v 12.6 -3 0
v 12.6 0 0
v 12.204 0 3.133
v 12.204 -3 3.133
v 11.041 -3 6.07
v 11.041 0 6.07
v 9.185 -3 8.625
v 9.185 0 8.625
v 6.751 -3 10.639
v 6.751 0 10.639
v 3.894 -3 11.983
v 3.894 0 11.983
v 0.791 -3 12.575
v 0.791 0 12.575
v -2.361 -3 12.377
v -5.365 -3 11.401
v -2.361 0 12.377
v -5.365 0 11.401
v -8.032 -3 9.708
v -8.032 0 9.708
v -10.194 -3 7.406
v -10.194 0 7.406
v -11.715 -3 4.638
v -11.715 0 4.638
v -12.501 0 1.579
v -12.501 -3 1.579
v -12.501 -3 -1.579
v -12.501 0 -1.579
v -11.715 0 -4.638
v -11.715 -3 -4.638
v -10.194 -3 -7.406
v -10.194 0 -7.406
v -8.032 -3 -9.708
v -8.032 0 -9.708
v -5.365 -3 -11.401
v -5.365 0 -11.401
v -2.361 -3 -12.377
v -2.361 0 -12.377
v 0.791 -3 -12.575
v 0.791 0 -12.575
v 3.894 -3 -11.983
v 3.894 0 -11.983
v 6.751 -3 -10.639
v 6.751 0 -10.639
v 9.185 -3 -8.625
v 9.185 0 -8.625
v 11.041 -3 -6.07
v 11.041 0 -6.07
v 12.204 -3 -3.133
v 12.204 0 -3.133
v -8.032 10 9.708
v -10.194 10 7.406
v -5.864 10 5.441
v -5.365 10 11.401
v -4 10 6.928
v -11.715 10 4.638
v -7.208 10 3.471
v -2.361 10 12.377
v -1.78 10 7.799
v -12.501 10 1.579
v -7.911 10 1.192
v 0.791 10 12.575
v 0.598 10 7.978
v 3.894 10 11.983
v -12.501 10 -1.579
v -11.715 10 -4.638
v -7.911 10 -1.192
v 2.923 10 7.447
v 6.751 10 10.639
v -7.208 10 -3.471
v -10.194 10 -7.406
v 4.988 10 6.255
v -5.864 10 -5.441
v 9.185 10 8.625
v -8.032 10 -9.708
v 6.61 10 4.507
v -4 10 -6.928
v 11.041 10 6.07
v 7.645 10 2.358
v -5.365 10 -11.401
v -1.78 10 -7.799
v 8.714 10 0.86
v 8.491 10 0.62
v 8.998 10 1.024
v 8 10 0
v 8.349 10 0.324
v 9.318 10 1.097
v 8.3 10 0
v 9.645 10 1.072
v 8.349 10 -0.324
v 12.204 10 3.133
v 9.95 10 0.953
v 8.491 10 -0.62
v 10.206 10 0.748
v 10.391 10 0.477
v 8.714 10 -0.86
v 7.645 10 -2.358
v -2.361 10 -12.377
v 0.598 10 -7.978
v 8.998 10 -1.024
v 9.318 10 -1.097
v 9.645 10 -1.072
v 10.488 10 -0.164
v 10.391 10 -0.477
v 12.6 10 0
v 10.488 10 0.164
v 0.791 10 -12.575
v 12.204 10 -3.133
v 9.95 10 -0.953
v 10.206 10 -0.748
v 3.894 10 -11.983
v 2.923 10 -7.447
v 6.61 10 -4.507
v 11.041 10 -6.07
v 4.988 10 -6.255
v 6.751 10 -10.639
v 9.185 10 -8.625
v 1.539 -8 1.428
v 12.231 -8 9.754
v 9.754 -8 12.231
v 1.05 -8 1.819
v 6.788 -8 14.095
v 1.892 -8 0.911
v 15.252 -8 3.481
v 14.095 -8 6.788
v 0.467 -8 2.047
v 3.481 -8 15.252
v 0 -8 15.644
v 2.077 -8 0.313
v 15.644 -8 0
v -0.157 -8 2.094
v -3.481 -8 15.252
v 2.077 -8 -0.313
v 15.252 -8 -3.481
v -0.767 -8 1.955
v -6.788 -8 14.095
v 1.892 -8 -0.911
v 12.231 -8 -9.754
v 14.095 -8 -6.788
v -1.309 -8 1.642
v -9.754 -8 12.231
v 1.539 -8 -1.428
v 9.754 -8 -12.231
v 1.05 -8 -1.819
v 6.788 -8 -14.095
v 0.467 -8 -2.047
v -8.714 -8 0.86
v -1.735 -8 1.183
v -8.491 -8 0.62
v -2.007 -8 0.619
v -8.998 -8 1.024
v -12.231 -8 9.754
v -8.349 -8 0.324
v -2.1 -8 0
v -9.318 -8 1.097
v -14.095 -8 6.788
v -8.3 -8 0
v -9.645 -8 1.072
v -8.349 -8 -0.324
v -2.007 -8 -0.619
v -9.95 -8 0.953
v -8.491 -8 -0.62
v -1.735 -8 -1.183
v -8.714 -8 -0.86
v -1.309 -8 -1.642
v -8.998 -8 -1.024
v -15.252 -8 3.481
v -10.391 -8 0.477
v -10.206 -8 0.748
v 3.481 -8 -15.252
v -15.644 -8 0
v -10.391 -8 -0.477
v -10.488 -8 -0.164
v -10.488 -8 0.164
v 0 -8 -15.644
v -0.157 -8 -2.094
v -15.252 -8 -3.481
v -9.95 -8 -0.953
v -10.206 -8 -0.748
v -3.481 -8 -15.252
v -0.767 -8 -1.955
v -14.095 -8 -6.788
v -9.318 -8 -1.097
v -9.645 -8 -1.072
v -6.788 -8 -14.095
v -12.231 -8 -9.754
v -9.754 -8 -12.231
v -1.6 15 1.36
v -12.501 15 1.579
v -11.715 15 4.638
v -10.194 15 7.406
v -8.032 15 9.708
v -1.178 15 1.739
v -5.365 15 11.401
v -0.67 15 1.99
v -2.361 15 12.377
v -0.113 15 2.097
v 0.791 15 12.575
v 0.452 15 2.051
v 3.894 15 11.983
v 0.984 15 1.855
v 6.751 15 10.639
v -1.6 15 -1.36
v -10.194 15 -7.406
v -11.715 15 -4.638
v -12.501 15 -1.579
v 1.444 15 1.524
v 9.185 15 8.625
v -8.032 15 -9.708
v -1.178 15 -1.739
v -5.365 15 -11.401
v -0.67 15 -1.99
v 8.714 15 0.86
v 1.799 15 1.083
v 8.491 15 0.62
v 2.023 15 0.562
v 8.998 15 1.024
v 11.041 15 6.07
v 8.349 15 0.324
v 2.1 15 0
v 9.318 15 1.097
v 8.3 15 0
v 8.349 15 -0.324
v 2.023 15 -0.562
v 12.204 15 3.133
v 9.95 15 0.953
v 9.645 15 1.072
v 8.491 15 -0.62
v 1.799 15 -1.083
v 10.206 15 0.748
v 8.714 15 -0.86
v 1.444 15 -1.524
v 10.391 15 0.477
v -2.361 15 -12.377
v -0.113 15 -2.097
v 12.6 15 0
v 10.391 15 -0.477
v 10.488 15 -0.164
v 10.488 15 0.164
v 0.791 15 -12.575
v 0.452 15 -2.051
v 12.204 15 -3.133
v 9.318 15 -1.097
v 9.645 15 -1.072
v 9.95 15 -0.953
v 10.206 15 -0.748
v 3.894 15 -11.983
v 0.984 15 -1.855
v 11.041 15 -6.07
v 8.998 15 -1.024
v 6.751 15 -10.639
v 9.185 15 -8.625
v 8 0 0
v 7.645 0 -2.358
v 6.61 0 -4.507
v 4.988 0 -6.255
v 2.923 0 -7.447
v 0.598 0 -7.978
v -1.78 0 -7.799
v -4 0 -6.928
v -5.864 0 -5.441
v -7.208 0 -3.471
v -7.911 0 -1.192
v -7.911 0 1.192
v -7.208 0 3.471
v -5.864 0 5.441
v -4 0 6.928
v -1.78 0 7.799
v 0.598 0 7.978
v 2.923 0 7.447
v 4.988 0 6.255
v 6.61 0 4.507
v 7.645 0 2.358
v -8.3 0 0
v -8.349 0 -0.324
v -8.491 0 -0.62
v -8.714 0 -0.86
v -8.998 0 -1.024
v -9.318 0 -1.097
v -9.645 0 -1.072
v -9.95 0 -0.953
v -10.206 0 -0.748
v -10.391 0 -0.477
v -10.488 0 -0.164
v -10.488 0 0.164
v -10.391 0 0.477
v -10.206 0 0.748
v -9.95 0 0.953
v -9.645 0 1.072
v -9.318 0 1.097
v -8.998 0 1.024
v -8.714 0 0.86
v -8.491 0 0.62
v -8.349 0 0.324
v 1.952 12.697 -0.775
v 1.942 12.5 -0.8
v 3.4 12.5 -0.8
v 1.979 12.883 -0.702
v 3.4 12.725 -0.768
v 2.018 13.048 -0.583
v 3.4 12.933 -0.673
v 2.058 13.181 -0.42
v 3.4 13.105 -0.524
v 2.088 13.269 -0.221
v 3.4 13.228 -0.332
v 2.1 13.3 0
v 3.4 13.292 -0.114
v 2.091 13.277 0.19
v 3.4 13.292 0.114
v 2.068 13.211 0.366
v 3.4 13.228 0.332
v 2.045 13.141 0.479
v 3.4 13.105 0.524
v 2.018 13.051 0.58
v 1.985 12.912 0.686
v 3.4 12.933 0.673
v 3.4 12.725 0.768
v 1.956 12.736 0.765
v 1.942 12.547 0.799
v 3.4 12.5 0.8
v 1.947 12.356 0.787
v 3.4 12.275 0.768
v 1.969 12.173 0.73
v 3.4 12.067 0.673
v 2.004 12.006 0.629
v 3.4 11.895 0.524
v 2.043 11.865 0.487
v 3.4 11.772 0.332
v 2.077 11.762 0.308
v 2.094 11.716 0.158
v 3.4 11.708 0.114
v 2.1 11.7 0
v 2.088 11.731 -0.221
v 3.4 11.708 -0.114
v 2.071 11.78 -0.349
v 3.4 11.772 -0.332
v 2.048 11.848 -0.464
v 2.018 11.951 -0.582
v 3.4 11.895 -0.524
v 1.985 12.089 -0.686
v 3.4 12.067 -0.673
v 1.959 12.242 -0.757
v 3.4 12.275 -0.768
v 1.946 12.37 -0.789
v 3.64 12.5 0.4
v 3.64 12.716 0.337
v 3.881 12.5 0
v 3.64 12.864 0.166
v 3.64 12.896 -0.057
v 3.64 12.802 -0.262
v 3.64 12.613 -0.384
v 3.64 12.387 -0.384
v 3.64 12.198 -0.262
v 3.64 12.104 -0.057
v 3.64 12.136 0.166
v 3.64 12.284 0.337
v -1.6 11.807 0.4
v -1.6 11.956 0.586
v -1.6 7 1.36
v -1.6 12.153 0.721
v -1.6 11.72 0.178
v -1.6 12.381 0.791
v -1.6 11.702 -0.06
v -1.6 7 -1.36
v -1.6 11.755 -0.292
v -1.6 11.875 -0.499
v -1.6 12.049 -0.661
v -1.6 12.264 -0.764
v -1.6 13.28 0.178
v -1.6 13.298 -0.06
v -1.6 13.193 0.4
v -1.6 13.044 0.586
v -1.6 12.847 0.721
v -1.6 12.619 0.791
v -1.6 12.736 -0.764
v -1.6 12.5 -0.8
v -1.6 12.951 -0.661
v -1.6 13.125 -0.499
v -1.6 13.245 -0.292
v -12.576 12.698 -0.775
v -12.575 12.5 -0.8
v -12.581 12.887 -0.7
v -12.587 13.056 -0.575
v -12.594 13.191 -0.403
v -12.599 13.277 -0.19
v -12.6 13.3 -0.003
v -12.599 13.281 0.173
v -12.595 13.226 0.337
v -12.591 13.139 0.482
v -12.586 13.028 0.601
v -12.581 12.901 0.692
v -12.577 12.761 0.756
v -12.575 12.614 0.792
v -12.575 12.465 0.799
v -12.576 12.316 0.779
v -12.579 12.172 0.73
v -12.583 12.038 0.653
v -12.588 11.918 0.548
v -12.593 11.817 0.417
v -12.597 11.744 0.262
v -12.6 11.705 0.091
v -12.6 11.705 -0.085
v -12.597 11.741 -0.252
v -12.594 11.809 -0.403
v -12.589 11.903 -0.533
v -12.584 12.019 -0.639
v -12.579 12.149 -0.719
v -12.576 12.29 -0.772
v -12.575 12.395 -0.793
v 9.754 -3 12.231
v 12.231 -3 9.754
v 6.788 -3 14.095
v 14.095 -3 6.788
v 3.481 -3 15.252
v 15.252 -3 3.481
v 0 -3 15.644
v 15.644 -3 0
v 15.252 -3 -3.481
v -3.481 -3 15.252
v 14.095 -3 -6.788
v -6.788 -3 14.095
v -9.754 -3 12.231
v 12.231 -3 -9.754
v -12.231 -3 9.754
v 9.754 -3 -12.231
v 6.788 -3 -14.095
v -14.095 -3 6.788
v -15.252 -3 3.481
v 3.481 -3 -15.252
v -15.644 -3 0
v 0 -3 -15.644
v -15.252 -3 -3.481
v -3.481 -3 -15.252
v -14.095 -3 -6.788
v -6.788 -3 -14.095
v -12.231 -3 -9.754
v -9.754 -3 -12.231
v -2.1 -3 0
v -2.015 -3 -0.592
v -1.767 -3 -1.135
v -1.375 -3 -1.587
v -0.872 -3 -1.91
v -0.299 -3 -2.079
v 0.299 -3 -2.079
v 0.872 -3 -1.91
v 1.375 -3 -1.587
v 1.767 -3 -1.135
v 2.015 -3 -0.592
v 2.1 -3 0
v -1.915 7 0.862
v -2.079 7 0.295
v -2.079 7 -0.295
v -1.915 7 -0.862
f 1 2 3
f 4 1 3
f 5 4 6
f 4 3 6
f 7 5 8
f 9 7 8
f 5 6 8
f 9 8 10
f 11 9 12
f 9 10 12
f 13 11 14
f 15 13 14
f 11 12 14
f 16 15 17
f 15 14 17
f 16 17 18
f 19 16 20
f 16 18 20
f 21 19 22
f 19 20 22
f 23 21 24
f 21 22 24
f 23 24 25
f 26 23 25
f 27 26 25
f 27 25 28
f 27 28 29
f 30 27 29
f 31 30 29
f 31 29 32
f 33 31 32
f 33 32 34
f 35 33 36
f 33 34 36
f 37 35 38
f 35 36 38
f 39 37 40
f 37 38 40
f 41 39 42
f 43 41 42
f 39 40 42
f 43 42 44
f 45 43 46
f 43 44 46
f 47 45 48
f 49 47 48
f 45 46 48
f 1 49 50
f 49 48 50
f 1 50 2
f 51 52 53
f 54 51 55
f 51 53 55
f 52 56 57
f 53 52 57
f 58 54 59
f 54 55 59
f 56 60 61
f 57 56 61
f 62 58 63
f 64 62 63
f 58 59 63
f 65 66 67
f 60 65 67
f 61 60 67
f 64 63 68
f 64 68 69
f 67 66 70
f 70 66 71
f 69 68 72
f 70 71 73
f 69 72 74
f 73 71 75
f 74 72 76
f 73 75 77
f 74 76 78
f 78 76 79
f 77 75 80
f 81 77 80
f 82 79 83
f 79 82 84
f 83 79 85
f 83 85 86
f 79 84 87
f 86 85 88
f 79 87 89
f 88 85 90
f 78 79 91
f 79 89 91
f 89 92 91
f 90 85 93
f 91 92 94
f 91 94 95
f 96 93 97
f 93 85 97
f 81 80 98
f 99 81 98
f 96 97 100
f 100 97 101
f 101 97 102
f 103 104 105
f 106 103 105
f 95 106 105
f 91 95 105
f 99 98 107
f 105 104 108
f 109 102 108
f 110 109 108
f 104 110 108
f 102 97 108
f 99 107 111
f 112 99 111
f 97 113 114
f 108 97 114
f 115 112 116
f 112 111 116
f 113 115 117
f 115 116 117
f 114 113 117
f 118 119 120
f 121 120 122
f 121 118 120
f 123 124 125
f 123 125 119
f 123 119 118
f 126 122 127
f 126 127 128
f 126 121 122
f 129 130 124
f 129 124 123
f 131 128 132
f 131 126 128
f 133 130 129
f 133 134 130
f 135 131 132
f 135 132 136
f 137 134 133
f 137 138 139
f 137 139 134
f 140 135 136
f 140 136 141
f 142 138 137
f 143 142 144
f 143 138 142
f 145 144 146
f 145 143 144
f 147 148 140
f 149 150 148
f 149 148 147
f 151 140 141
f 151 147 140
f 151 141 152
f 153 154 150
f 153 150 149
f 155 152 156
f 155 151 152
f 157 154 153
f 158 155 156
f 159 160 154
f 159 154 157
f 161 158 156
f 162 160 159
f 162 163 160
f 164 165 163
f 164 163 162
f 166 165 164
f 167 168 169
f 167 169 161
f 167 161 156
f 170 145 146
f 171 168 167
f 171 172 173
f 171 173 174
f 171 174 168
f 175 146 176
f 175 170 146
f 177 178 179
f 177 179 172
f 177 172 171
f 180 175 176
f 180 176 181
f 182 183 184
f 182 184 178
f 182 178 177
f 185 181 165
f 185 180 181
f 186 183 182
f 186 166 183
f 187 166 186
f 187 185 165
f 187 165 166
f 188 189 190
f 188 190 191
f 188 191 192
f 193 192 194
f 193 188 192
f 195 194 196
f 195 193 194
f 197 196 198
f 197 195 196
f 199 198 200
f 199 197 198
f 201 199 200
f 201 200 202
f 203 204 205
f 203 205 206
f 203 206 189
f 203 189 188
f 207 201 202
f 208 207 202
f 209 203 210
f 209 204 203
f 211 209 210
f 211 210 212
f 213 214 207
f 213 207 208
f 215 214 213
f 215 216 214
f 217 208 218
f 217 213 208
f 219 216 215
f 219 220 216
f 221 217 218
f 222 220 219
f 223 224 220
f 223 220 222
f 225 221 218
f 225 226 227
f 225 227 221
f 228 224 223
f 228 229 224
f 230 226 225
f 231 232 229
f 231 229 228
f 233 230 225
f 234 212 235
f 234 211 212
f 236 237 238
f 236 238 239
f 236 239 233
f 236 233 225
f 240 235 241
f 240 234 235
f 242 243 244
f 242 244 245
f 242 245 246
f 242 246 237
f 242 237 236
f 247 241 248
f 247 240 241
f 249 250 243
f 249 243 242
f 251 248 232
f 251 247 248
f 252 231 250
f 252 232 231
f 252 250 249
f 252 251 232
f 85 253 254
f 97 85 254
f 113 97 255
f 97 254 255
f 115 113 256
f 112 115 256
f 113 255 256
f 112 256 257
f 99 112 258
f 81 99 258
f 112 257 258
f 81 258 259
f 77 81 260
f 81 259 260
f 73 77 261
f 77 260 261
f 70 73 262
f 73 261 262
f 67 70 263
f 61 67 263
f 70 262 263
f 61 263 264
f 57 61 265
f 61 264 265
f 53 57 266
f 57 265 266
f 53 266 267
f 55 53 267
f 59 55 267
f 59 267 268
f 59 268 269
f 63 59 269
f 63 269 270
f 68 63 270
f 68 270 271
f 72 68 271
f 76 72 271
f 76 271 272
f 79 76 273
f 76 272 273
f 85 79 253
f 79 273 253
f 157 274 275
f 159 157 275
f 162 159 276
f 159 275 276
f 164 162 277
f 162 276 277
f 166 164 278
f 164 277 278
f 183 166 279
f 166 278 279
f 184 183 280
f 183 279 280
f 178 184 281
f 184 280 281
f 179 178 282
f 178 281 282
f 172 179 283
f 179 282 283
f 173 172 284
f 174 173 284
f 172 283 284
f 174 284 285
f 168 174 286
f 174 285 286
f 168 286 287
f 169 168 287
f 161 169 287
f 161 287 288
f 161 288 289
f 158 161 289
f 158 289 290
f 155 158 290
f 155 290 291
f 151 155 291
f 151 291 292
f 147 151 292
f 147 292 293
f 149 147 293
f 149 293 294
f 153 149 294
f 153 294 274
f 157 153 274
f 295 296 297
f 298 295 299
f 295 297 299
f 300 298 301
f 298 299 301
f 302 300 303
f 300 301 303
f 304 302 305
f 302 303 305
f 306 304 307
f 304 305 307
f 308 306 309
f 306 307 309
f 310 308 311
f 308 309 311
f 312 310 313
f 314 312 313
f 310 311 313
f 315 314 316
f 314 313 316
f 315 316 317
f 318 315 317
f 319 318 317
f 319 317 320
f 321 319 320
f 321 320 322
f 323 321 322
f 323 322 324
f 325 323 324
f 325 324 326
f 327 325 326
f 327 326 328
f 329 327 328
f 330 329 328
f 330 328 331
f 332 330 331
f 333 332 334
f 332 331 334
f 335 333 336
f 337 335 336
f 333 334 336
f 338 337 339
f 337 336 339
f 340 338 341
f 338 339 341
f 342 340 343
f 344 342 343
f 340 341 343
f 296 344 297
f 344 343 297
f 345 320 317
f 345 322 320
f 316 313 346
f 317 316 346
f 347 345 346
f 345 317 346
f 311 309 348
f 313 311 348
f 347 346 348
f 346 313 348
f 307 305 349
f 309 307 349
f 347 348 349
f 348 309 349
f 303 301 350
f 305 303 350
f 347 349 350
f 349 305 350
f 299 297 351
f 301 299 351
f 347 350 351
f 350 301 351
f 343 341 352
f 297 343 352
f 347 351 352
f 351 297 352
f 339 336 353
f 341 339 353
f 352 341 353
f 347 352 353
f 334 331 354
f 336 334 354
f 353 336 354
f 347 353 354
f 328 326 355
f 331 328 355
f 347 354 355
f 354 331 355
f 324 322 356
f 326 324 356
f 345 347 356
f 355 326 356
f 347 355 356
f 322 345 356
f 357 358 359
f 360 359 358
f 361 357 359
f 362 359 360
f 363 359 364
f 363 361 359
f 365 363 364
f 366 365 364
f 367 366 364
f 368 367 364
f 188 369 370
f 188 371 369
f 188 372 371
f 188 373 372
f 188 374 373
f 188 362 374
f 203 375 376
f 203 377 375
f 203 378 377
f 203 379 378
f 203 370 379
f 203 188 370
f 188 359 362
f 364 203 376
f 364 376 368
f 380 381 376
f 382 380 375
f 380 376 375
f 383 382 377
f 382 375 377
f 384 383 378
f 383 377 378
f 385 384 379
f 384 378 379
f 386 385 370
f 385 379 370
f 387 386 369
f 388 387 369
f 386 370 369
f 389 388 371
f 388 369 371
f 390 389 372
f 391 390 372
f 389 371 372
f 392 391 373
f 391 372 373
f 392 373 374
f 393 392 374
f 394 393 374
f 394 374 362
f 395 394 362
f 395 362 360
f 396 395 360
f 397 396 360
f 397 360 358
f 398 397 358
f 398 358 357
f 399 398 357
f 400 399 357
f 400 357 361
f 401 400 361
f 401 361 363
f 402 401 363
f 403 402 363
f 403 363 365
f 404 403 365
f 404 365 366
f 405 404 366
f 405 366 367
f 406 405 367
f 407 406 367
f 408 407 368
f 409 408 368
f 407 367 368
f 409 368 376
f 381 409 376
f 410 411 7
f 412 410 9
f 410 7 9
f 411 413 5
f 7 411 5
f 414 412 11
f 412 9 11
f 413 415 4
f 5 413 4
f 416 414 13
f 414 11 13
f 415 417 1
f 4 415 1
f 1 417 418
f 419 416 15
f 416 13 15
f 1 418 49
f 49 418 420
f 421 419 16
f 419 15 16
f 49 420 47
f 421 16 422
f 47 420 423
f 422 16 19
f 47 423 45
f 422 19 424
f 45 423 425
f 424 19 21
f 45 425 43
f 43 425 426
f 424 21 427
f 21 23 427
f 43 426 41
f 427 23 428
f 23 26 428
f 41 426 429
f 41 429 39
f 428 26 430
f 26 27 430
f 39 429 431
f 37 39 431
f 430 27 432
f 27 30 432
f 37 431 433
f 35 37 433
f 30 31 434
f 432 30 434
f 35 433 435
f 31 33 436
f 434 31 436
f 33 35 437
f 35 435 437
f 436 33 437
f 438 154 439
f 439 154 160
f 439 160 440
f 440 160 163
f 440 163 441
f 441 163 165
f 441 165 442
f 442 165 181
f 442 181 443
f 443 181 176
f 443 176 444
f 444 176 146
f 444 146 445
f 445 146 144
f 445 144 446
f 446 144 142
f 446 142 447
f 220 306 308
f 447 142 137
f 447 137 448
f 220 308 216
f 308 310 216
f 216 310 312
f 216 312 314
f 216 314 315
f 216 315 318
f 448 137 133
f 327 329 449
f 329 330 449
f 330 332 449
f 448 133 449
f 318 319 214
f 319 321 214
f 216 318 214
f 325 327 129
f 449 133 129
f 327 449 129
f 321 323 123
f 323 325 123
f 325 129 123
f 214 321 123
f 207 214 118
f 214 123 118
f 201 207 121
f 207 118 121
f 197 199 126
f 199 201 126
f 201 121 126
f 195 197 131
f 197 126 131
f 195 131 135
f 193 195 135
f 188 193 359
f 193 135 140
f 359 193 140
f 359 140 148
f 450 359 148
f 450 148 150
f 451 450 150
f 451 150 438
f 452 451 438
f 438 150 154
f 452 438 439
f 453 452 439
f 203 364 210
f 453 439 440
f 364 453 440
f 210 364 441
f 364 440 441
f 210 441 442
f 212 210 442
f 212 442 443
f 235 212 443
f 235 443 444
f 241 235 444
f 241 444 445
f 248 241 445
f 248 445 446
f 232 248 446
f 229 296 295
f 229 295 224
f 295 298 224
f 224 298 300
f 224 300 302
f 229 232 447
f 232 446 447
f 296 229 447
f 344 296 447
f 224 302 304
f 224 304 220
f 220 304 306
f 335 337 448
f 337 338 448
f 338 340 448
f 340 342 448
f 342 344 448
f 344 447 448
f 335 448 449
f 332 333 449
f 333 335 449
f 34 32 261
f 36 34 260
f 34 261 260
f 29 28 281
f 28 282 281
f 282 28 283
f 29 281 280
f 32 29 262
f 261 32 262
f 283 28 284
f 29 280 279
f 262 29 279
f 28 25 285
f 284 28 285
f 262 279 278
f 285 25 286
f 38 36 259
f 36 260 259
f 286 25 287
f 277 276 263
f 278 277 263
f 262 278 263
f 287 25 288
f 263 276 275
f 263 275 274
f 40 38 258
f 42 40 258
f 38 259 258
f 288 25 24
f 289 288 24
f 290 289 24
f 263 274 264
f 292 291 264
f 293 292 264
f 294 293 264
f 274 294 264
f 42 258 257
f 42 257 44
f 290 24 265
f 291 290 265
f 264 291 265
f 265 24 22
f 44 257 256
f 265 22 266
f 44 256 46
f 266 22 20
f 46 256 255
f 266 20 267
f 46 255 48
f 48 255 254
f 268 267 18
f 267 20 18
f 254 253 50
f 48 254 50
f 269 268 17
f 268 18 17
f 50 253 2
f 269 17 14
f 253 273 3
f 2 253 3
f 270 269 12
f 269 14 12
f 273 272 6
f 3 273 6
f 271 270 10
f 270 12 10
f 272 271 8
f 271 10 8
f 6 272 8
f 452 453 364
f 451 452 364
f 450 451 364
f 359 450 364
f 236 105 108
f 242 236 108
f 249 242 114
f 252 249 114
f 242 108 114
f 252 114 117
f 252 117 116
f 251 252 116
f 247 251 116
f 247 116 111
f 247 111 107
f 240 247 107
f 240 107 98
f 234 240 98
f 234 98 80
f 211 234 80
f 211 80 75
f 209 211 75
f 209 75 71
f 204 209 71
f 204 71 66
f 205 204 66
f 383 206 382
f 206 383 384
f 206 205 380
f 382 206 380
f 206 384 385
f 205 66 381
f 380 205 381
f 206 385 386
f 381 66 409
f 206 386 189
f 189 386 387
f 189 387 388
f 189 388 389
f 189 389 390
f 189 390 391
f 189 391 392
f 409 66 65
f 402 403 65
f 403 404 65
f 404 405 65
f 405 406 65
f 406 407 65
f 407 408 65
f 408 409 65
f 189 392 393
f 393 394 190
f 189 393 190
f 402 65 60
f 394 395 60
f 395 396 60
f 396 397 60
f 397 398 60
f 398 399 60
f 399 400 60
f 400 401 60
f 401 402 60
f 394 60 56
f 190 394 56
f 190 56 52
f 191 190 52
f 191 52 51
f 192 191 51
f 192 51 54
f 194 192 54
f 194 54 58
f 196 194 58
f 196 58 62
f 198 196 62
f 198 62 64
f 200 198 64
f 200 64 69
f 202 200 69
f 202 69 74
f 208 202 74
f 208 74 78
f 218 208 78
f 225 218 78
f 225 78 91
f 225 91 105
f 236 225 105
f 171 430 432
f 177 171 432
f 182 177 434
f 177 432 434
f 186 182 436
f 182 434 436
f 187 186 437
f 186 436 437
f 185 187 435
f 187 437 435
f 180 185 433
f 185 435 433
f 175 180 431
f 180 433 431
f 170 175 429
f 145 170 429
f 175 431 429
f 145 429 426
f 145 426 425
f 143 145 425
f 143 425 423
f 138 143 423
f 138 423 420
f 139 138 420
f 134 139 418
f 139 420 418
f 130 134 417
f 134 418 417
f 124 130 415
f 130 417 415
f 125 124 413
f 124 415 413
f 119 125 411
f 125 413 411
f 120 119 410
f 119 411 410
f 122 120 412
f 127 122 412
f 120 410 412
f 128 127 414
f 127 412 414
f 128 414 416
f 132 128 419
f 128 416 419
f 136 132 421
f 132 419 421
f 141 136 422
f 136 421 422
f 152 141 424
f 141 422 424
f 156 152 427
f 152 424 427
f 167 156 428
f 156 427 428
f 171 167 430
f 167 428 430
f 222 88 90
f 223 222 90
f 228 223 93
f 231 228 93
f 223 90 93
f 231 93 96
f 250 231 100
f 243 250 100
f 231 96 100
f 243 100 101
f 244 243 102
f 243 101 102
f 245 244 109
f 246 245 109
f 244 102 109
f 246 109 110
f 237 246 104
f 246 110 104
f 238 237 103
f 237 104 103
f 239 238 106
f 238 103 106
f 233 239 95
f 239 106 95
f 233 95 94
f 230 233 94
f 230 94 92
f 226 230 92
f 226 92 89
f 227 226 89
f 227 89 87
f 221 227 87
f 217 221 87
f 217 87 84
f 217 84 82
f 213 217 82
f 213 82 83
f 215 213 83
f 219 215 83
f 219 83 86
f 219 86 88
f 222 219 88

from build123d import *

# Parameters (mm, degrees)
SKETCH1_R                       = 8
BOSS_EXTRUDE1_DEPTH             = 10
SKETCH2_R                       = 12.6
BOSS_EXTRUDE2_DEPTH             = 3
SKETCH4_R                       = 1.5
CUT_EXTRUDE4_DEPTH              = 13
SKETCH3_R                       = 12.6
BOSS_EXTRUDE4_DEPTH             = 5
SKETCH5_R                       = 2.1
CUT_EXTRUDE5_DEPTH              = 19
SKETCH6_W                       = 1
SKETCH6_H                       = 4.89371283
BOSS_EXTRUDE5_DEPTH             = 8
TAP_DRILL_FOR_M2X0_4_TAP1_D     = 1.6
TAP_DRILL_FOR_M2X0_4_TAP1_DEPTH = 16
TAP_DRILL_FOR_M2X0_4_TAP1_TIP   = 0.480688495
SKETCH16_R                      = 15.644014
BOSS_EXTRUDE6_DEPTH             = 5
SKETCH17_R                      = 2.1
CUT_EXTRUDE6_DEPTH              = 5
SKETCH18_R                      = 1.1
CUT_EXTRUDE9_DEPTH              = 9.0000001
SKETCH19_R                      = 1.1
CUT_EXTRUDE10_DEPTH             = 10


with BuildPart() as part:
    # Sketch1 → Boss-Extrude1 (new body)
    with BuildSketch(Plane(origin=(0, 0, 0), x_dir=(1, 0, 0), z_dir=(0, 1, 0))):
        Circle(SKETCH1_R)
    extrude(amount=BOSS_EXTRUDE1_DEPTH)

    # Sketch2 → Boss-Extrude2 (add)
    with BuildSketch(Plane.XZ):
        Circle(SKETCH2_R)
    extrude(amount=BOSS_EXTRUDE2_DEPTH)

    # Sketch4 → Cut-Extrude4 (cut)
    with BuildSketch(Plane(origin=(0, 10, 0), x_dir=(1, 0, 0), z_dir=(0, 1, 0))):
        Circle(SKETCH4_R)
    extrude(amount=-CUT_EXTRUDE4_DEPTH, mode=Mode.SUBTRACT)

    # Sketch3 → Boss-Extrude4 (add)
    with BuildSketch(Plane(origin=(0, 10, 0), x_dir=(1, 0, 0), z_dir=(0, 1, 0))):
        Circle(SKETCH3_R)
    extrude(amount=BOSS_EXTRUDE4_DEPTH)

    # Sketch5 → Cut-Extrude5 (cut, through all)
    with BuildSketch(Plane(origin=(0, 15, 0), x_dir=(1, 0, 0), z_dir=(0, 1, 0))):
        Circle(SKETCH5_R)
    extrude(amount=-CUT_EXTRUDE5_DEPTH, mode=Mode.SUBTRACT)

    # Sketch6 → Boss-Extrude5 (add)
    with BuildSketch(Plane(origin=(0, 15, 0), x_dir=(1, 0, 0), z_dir=(0, 1, 0))):
        with Locations((-2.1, 0)):
            Rectangle(SKETCH6_W, SKETCH6_H)
    extrude(amount=-BOSS_EXTRUDE5_DEPTH)

    # Tap Drill for M2x0.4 Tap1
    with Locations(Plane.ZY.offset(12.6)):
        with Locations((0, 12.5)):
            Hole(TAP_DRILL_FOR_M2X0_4_TAP1_D / 2, depth=TAP_DRILL_FOR_M2X0_4_TAP1_DEPTH)
            with Locations((0, 0, -(TAP_DRILL_FOR_M2X0_4_TAP1_DEPTH + TAP_DRILL_FOR_M2X0_4_TAP1_TIP / 2))):  # 118° drill point
                Cone(0, TAP_DRILL_FOR_M2X0_4_TAP1_D / 2, TAP_DRILL_FOR_M2X0_4_TAP1_TIP, mode=Mode.SUBTRACT)

    # Sketch16 → Boss-Extrude6 (add)
    with BuildSketch(Plane(origin=(0, -3, 0), x_dir=(-1, 0, 0), z_dir=(0, -1, 0))):
        Circle(SKETCH16_R)
    extrude(amount=BOSS_EXTRUDE6_DEPTH)

    # Sketch17 → Cut-Extrude6 (cut)
    with BuildSketch(Plane(origin=(0, -8, 0), x_dir=(-1, 0, 0), z_dir=(0, -1, 0))):
        Circle(SKETCH17_R)
    extrude(amount=-CUT_EXTRUDE6_DEPTH, mode=Mode.SUBTRACT)

    # Sketch18 → Cut-Extrude9 (cut, through all)
    with BuildSketch(Plane(origin=(0, 0, 0), x_dir=(1, 0, 0), z_dir=(0, 1, 0))):
        with Locations((-9.4, 0)):
            Circle(SKETCH18_R)
    extrude(amount=-CUT_EXTRUDE9_DEPTH, mode=Mode.SUBTRACT)

    # Sketch19 → Cut-Extrude10 (cut)
    with BuildSketch(Plane(origin=(0, 10, 0), x_dir=(-1, 0, 0), z_dir=(0, -1, 0))):
        with Locations((-9.4, 0)):
            Circle(SKETCH19_R)
    extrude(amount=-CUT_EXTRUDE10_DEPTH, mode=Mode.SUBTRACT)


solid = part.part
